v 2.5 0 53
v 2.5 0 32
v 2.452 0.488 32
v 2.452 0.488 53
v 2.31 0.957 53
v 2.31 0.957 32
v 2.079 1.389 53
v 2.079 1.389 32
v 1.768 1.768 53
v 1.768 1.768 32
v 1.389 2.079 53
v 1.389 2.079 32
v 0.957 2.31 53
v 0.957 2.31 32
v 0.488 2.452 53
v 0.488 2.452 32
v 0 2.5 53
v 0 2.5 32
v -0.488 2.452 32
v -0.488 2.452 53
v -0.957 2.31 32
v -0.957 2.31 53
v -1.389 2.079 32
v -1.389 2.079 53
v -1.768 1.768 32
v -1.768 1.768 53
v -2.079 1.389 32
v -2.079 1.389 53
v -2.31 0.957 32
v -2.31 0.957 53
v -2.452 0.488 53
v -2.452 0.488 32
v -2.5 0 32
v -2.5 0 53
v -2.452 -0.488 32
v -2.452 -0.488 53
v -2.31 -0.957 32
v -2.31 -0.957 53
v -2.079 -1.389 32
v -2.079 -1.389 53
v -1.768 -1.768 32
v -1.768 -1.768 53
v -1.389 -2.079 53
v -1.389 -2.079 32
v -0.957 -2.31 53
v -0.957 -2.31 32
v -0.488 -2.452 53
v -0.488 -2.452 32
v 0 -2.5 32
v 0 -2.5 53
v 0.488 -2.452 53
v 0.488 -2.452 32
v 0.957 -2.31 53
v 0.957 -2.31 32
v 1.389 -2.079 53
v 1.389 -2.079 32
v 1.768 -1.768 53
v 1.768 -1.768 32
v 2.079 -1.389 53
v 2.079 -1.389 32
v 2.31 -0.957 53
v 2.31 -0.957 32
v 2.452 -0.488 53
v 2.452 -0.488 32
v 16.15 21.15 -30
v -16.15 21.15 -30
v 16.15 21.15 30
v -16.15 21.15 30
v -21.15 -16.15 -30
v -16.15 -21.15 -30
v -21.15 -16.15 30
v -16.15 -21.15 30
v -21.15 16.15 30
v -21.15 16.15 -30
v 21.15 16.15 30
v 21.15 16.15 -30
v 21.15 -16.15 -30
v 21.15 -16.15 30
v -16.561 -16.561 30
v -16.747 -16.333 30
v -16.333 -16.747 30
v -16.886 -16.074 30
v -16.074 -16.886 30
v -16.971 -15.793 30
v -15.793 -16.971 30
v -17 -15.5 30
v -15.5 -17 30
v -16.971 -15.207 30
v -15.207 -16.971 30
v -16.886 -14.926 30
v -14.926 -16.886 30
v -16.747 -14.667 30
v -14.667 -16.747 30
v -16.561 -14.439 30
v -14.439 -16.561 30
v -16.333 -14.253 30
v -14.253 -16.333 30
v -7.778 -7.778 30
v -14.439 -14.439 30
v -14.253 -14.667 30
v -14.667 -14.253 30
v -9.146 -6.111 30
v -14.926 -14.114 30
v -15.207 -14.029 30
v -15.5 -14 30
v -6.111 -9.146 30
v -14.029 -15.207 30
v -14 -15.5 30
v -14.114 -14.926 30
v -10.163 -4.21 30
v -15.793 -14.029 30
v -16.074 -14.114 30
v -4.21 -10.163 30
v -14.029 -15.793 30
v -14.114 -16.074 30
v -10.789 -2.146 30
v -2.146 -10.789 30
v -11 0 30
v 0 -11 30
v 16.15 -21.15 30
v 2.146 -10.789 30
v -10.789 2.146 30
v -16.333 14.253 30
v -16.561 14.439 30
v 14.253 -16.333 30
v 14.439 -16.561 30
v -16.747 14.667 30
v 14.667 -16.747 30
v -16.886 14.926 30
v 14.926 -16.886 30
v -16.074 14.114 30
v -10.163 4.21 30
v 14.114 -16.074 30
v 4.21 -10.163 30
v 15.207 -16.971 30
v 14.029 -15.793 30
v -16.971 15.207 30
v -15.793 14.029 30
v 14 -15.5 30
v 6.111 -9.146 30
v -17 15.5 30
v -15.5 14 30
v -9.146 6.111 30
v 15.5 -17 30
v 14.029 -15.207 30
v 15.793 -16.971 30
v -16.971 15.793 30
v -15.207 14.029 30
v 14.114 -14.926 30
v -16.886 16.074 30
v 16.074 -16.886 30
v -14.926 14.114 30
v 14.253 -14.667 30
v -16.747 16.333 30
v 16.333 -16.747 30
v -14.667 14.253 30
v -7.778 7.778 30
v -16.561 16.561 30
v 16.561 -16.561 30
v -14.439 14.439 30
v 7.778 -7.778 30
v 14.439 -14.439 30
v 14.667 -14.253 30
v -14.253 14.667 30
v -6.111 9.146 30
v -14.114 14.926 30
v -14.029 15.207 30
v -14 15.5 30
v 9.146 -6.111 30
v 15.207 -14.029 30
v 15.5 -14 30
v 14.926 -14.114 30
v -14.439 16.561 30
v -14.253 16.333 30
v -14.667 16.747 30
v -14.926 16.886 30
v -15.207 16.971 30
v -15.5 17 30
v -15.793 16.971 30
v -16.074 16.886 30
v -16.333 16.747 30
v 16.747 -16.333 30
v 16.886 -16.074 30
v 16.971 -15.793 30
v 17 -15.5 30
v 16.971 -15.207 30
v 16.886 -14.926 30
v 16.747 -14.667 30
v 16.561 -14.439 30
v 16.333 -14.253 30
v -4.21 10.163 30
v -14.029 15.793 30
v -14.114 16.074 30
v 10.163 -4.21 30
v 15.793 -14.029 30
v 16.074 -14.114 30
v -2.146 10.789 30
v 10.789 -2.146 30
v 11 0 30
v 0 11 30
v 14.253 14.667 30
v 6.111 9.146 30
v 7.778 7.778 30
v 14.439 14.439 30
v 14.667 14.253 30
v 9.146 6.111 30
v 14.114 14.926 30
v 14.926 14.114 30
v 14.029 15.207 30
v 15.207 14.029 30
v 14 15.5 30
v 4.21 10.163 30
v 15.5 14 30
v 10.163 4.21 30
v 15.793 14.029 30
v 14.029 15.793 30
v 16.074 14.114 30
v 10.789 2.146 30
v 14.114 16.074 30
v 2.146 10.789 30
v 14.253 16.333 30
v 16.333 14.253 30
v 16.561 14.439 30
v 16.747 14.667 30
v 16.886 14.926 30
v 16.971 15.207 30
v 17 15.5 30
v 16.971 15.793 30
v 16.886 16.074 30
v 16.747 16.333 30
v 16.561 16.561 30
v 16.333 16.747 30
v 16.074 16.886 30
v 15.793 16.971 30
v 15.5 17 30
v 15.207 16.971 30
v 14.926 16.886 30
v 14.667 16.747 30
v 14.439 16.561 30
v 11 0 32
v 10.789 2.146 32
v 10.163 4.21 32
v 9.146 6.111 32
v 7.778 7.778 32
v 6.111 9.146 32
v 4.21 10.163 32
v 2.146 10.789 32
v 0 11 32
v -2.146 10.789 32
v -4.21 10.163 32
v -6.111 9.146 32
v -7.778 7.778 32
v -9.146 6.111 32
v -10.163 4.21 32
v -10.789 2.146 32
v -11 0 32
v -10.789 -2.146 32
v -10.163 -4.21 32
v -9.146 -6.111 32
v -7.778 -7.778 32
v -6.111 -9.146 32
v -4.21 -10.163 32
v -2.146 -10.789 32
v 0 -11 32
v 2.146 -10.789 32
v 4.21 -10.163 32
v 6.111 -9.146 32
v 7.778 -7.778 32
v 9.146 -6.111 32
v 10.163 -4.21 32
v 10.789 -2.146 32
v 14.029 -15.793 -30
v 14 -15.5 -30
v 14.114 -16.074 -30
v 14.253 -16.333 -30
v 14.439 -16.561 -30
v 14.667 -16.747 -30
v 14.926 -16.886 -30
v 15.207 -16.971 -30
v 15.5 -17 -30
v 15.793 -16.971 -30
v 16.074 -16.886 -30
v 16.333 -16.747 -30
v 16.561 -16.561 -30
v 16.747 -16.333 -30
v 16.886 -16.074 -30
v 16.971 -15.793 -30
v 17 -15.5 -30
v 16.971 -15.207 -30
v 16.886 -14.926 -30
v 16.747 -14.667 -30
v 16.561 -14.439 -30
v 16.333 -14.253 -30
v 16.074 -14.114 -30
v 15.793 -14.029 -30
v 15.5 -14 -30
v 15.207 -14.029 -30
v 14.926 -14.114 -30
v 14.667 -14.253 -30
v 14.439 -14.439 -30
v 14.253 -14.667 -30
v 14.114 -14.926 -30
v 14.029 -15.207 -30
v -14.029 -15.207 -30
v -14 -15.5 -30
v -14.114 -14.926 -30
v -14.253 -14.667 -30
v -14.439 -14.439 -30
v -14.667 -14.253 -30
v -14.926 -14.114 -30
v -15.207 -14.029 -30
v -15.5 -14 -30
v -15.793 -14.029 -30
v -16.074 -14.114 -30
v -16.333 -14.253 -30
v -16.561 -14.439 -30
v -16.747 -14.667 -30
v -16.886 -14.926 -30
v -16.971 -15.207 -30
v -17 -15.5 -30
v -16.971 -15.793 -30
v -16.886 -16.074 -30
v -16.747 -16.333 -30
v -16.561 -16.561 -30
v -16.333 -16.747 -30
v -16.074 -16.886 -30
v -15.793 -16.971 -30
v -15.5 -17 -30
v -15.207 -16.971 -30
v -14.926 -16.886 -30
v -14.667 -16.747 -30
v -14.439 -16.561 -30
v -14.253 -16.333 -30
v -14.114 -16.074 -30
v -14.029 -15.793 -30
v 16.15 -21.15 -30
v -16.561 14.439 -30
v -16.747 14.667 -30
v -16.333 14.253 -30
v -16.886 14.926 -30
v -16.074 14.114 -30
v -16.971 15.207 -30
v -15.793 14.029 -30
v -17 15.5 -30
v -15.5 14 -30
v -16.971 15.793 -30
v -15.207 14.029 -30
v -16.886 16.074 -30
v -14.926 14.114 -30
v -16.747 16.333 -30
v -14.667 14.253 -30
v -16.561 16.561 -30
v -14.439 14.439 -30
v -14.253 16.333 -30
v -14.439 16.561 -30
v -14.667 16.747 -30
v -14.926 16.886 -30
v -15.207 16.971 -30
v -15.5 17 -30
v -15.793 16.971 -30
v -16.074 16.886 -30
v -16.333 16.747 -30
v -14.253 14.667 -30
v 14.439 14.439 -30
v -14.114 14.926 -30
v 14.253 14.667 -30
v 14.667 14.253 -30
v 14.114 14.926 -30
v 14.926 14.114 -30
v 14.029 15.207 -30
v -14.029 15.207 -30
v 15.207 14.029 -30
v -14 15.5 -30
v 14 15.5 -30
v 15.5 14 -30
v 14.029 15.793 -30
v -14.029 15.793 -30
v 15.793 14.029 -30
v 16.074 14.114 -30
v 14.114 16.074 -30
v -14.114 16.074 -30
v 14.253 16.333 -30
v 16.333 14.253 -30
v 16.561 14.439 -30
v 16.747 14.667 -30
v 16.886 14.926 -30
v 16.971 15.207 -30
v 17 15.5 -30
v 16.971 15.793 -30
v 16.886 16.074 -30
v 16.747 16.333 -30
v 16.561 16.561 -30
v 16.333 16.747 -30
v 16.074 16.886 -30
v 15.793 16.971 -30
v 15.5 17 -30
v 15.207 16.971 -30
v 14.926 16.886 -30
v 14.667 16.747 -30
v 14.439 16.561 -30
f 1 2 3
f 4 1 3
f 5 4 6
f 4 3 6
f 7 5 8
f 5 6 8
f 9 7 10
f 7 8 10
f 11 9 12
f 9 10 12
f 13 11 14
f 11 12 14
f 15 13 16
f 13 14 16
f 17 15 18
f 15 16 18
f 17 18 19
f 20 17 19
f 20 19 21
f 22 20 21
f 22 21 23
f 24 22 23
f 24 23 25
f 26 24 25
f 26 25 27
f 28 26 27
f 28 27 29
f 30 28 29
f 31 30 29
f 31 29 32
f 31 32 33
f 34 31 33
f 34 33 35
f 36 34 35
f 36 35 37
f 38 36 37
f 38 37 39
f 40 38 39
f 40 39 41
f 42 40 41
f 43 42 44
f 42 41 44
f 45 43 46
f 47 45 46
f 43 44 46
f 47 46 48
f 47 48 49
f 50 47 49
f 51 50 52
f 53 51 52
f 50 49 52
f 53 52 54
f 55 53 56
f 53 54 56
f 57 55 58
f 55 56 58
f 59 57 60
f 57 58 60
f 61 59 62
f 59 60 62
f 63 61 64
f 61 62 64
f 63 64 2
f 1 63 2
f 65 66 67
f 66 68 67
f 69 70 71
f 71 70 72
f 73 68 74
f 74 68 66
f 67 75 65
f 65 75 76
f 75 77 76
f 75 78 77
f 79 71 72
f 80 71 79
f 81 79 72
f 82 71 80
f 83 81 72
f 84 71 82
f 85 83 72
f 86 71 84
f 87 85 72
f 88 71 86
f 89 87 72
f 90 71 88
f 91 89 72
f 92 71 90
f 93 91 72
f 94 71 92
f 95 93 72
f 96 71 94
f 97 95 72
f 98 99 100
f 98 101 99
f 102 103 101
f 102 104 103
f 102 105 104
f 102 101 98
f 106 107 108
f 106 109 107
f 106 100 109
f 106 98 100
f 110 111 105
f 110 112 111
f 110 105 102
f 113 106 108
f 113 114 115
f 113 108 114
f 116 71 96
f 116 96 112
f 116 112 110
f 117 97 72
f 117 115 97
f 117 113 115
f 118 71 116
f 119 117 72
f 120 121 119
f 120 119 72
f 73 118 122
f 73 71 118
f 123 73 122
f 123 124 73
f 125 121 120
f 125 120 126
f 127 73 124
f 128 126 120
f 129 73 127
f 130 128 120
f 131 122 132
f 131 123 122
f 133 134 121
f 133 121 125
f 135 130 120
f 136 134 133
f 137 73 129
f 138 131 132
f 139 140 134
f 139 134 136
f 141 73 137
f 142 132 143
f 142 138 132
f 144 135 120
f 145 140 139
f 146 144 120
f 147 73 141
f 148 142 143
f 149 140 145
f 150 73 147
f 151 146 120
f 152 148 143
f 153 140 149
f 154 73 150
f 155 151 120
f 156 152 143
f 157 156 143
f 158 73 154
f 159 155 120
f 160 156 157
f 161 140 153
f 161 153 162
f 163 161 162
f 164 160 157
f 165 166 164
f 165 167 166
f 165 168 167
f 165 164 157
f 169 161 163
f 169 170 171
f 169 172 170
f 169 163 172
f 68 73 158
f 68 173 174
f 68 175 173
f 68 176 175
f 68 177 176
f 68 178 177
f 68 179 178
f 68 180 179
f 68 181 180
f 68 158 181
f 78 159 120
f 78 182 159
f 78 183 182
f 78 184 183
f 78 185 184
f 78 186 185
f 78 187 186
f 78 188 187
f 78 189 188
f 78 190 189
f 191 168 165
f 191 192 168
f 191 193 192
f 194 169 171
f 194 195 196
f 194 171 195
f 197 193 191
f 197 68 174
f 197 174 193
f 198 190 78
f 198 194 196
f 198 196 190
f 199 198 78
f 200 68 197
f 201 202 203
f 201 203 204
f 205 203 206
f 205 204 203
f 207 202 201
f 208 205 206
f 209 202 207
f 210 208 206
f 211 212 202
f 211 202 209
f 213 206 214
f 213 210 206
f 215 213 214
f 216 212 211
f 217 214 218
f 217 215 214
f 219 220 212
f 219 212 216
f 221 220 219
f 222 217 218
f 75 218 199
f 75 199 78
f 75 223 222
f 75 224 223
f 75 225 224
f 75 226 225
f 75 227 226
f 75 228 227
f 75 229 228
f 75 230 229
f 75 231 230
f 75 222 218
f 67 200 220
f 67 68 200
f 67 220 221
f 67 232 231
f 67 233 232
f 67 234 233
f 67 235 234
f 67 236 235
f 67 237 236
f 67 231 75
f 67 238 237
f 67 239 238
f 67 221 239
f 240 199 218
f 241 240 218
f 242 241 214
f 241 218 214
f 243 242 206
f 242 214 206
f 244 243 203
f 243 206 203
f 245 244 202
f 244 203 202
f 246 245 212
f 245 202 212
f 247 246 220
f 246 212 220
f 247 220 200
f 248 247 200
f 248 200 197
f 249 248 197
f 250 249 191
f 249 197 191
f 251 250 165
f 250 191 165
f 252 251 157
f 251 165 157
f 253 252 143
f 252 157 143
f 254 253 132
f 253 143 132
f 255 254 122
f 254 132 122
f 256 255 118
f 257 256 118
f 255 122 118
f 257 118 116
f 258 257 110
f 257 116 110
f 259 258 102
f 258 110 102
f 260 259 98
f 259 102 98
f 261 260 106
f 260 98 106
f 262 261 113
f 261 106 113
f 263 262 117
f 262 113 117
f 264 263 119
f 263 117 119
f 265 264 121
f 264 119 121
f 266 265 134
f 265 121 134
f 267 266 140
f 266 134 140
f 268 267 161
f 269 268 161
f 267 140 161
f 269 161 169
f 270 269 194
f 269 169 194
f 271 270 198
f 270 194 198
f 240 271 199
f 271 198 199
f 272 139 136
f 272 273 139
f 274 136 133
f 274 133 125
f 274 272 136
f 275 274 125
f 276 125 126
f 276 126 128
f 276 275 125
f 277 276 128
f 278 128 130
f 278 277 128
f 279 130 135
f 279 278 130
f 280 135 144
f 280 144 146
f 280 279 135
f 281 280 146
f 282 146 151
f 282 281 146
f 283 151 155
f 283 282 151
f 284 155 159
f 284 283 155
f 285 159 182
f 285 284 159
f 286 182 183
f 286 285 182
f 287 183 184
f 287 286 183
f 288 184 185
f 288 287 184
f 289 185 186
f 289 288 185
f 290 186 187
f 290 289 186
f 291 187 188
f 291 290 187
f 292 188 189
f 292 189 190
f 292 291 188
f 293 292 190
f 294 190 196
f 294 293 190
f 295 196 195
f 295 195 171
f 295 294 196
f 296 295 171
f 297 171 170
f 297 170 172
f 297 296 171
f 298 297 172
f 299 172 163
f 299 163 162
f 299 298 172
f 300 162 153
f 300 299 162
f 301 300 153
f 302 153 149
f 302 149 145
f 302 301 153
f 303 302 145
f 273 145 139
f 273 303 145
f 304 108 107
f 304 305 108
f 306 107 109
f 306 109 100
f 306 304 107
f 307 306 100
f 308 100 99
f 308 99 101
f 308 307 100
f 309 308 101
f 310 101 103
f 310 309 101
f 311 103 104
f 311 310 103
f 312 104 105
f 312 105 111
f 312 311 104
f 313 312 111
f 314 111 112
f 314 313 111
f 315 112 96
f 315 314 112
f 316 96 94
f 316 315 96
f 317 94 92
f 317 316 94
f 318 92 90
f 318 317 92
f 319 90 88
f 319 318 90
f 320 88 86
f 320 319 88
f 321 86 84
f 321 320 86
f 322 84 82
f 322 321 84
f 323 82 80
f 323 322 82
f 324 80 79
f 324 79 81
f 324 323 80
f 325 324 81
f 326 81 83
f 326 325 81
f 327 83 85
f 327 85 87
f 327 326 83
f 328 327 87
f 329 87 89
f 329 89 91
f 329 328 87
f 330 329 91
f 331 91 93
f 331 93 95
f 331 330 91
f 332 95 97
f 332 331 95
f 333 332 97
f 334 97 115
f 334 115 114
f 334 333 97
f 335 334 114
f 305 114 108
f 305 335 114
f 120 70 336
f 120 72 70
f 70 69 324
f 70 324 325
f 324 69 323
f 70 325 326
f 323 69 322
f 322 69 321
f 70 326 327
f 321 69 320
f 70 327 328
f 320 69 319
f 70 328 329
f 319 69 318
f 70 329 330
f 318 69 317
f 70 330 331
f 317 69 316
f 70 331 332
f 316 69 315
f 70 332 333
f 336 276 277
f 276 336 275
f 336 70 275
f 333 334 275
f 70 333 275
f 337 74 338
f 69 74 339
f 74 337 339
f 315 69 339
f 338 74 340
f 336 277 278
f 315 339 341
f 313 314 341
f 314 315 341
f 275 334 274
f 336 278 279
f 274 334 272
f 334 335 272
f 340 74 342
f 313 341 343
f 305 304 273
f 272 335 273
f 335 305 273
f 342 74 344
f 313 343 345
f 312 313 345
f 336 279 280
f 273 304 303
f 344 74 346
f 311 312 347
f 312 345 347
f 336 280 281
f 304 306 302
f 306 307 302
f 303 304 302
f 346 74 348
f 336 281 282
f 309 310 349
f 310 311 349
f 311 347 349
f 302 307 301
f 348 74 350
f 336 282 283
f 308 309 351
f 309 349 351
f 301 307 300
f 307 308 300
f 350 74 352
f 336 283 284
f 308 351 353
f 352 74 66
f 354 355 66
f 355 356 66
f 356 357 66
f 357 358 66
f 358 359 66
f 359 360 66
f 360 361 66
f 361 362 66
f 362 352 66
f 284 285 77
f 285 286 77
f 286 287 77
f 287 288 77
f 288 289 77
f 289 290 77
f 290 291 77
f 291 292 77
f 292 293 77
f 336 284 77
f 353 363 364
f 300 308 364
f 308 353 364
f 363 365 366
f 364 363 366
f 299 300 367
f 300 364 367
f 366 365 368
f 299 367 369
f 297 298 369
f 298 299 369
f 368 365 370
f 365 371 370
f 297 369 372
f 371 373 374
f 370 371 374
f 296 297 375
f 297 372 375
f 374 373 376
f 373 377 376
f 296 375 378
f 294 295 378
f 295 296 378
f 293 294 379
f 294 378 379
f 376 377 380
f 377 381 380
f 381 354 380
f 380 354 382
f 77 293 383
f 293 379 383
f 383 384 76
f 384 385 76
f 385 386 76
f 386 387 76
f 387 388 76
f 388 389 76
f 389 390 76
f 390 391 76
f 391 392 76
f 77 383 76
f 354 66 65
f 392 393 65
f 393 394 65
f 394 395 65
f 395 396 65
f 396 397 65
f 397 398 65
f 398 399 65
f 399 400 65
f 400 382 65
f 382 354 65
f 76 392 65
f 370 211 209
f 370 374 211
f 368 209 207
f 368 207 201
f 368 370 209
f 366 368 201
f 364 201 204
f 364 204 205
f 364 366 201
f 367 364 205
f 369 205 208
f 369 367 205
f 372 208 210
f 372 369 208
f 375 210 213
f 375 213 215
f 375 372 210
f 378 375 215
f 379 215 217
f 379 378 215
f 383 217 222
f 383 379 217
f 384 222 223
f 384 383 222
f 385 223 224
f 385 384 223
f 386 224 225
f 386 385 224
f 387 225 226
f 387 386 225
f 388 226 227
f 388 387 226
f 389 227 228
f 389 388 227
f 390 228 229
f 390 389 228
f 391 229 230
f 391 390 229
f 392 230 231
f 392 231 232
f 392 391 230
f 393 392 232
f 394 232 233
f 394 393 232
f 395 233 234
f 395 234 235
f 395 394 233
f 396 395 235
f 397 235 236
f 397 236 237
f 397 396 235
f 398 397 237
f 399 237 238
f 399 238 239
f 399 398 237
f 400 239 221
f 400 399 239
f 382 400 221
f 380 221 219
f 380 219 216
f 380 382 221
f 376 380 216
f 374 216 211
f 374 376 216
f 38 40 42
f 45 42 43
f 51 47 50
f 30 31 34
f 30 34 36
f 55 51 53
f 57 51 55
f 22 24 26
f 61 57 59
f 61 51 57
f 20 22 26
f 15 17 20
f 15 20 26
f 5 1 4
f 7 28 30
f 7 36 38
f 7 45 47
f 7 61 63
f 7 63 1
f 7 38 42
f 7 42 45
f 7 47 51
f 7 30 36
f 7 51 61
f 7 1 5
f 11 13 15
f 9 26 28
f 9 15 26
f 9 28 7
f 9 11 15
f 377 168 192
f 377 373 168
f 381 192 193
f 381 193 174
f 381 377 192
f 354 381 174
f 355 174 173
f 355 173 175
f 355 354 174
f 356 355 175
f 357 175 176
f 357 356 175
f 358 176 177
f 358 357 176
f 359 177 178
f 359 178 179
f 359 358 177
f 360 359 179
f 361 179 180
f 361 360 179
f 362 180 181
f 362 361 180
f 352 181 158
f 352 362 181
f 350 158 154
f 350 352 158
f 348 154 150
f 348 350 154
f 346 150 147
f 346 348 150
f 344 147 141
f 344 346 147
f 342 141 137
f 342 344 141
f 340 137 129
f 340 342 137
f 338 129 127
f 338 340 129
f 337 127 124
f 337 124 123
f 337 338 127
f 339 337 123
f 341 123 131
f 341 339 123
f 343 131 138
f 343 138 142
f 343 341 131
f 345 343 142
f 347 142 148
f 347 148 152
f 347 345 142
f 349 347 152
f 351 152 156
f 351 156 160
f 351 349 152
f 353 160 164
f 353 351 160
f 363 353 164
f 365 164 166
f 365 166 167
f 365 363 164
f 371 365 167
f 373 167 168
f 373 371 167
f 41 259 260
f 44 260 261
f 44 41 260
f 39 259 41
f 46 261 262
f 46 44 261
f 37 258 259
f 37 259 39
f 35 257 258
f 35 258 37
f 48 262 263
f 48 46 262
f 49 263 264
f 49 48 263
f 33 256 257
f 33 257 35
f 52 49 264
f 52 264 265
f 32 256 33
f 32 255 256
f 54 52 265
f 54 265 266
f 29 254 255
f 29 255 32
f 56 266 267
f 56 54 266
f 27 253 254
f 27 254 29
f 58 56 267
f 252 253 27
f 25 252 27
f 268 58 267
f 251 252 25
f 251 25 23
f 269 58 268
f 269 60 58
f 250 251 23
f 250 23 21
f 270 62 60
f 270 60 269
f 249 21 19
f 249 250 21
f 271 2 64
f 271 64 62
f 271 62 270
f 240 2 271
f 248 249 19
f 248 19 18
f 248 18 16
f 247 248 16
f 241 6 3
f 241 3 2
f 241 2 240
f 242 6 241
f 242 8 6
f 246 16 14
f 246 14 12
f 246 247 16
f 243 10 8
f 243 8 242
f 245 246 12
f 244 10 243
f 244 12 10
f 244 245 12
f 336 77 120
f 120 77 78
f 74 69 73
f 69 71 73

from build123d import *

# Parameters (mm, degrees)
CROQUIS1_W              = 42.3
CROQUIS1_H              = 42.3
CROQUIS1_R              = 1.5
SALIENTE_EXTRUIR1_DEPTH = 30
CROQUIS2_R              = 11
SALIENTE_EXTRUIR2_DEPTH = 2
CROQUIS3_R              = 2.5
SALIENTE_EXTRUIR3_DEPTH = 23
CHAFL_N1_SIZE           = 5


with BuildPart() as part:
    # Croquis1 → Saliente-Extruir1 (new, symmetric)
    with BuildSketch(Plane.XY):
        Rectangle(CROQUIS1_W, CROQUIS1_H)
        with Locations((-15.5, 15.5)):
            Circle(CROQUIS1_R, mode=Mode.SUBTRACT)
        with Locations((-15.5, -15.5)):
            Circle(CROQUIS1_R, mode=Mode.SUBTRACT)
        with Locations(Location((15.5, -15.5, 0), (0, 0, 180))):
            Circle(CROQUIS1_R, mode=Mode.SUBTRACT)
        with Locations(Location((15.5, 15.5, 0), (0, 0, 180))):
            Circle(CROQUIS1_R, mode=Mode.SUBTRACT)
    extrude(amount=SALIENTE_EXTRUIR1_DEPTH, both=True)

    # Croquis2 → Saliente-Extruir2 (add)
    with BuildSketch(Plane.XY.offset(30)):
        Circle(CROQUIS2_R)
    extrude(amount=SALIENTE_EXTRUIR2_DEPTH)

    # Croquis3 → Saliente-Extruir3 (add)
    with BuildSketch(Plane.XY.offset(30)):
        Circle(CROQUIS3_R)
    extrude(amount=SALIENTE_EXTRUIR3_DEPTH)

    # Chaflán1
    chafl_n1_edges = [part.edges().sort_by_distance(p)[0] for p in [
        (-21.15, 21.15, 0),
        (21.15, 21.15, 0),
        (21.15, -21.15, 0),
        (-21.15, -21.15, 0),
    ]]
    chamfer(chafl_n1_edges, length=CHAFL_N1_SIZE)


solid = part.part
